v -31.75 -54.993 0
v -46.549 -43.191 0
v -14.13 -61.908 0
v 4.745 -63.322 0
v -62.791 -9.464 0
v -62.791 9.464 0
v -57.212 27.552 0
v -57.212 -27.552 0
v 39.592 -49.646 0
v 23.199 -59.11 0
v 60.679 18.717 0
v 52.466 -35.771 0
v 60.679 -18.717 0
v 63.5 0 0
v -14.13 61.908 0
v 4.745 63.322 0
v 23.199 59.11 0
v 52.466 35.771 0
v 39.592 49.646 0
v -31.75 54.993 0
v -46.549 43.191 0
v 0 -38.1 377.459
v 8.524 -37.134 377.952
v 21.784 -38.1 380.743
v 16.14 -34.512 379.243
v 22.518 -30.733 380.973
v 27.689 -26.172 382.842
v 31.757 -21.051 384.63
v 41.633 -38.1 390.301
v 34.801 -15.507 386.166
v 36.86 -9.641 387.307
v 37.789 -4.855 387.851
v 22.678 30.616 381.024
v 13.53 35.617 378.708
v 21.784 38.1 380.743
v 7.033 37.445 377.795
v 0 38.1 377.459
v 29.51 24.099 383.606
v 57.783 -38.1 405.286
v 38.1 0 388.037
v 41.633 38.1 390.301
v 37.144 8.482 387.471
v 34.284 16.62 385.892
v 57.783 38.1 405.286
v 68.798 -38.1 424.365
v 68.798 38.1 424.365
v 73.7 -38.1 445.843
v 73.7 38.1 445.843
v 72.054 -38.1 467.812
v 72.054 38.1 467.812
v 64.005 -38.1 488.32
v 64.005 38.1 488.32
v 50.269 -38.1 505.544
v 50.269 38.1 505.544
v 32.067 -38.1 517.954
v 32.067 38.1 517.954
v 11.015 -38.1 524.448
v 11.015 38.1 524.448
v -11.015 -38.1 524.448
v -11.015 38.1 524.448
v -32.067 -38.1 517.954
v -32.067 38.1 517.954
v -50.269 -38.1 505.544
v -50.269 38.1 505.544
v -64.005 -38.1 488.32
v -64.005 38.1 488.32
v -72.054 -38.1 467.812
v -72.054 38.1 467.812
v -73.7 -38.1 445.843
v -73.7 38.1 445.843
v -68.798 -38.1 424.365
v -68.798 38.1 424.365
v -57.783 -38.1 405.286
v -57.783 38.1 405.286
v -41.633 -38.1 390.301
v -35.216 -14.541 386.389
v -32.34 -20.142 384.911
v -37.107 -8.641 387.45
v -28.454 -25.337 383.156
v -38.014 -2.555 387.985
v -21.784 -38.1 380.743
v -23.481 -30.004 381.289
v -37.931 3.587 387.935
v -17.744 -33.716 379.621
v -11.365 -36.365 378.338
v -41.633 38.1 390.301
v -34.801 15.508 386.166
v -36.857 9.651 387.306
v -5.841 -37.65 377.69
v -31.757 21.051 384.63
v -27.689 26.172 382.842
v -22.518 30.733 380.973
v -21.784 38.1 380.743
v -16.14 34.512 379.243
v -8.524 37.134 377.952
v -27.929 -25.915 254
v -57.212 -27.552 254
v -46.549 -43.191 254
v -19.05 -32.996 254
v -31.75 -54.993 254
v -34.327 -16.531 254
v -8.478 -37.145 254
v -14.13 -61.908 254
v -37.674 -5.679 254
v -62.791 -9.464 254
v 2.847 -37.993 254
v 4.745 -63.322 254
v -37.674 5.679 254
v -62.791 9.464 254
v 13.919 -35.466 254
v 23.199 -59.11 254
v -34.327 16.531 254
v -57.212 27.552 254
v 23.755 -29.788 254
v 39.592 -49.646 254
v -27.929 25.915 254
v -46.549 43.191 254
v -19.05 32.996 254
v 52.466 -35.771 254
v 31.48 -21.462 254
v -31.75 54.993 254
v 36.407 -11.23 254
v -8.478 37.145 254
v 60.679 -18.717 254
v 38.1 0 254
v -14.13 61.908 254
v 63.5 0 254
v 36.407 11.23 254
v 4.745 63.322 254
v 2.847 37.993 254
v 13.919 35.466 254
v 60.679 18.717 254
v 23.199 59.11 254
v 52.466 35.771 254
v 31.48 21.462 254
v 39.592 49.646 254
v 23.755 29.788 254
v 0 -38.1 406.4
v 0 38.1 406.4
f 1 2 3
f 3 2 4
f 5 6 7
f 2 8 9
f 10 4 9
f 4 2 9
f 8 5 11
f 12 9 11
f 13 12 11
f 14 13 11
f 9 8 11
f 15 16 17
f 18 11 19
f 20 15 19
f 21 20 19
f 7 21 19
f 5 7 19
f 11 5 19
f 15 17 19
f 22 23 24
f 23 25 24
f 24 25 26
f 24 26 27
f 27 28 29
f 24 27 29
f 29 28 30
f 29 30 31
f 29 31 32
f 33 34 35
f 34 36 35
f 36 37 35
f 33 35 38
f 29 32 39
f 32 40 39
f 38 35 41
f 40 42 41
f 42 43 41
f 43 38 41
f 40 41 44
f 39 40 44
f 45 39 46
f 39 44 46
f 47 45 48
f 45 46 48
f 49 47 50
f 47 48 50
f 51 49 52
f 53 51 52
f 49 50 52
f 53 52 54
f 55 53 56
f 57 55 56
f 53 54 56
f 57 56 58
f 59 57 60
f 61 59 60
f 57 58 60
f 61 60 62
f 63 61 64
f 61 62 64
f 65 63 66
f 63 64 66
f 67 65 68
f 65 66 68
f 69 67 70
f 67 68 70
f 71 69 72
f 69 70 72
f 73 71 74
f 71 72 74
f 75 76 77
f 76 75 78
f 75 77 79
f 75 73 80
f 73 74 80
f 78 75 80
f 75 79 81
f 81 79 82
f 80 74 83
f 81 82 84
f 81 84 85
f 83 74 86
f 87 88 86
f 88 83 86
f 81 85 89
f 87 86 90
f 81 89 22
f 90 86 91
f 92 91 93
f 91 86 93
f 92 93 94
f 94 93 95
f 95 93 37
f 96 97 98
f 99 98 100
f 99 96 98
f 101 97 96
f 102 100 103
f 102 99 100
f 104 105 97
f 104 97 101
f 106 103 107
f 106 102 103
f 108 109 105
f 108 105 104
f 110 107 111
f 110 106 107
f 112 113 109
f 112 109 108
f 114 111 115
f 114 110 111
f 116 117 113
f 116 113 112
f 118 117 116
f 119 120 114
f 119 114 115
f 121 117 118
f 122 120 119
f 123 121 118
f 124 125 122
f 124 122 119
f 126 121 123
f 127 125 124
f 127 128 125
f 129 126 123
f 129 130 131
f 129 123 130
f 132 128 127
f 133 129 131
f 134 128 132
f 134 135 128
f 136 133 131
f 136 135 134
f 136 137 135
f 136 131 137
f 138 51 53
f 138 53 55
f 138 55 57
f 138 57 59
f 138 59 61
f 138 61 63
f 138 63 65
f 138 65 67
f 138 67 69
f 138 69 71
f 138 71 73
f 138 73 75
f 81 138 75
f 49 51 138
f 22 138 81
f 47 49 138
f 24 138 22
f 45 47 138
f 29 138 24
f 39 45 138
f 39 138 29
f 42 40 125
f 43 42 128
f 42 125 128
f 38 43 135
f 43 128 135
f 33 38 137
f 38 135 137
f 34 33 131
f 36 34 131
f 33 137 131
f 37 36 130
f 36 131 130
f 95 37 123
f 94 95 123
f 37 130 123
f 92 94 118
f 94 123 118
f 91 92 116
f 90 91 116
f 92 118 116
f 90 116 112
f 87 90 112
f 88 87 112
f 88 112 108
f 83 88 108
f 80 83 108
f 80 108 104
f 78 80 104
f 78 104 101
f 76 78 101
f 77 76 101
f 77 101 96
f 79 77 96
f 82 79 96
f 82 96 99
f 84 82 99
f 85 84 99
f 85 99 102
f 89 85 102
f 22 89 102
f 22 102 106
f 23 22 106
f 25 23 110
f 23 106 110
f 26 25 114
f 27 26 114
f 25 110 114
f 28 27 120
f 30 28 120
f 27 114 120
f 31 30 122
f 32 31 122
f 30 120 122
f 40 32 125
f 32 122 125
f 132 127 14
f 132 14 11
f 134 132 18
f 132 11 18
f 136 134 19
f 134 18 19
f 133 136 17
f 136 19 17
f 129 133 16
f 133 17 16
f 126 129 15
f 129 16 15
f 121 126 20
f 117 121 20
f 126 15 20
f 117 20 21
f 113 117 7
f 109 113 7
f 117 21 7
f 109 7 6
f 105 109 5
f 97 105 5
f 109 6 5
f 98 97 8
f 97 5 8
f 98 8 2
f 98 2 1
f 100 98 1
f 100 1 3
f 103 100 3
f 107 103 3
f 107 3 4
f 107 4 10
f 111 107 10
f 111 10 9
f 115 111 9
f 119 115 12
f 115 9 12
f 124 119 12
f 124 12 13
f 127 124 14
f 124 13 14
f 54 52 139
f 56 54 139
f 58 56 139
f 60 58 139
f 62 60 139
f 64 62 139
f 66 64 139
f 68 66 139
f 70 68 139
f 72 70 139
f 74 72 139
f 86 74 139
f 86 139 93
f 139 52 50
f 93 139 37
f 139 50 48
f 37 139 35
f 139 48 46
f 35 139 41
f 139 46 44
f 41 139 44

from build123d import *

# Parameters (mm, degrees)
F0_R     = 63.5
F1_DEPTH = 254
F3_R     = 38.1
F2_DEPTH = 152.4
F4_W     = 76.2
F4_H     = 73.906902


with BuildPart() as f1:
    # F0 (on Top) → F1 (new body)
    with BuildSketch(Plane.XY):
        Circle(F0_R)
    extrude(amount=F1_DEPTH)

    # F3 (on face) → F2 (join)
    with BuildSketch(Plane.XY.offset(254)):
        Circle(F3_R)
    extrude(amount=F2_DEPTH)

    # F4 (on Right) → F5 (revolve)
    with BuildSketch(Plane.YZ):
        with Locations((0, 414.412725)):
            Rectangle(F4_W, F4_H)
    revolve(axis=Axis((0, 0, 451.366176), (0, -1, 0)))


solid = f1.part
